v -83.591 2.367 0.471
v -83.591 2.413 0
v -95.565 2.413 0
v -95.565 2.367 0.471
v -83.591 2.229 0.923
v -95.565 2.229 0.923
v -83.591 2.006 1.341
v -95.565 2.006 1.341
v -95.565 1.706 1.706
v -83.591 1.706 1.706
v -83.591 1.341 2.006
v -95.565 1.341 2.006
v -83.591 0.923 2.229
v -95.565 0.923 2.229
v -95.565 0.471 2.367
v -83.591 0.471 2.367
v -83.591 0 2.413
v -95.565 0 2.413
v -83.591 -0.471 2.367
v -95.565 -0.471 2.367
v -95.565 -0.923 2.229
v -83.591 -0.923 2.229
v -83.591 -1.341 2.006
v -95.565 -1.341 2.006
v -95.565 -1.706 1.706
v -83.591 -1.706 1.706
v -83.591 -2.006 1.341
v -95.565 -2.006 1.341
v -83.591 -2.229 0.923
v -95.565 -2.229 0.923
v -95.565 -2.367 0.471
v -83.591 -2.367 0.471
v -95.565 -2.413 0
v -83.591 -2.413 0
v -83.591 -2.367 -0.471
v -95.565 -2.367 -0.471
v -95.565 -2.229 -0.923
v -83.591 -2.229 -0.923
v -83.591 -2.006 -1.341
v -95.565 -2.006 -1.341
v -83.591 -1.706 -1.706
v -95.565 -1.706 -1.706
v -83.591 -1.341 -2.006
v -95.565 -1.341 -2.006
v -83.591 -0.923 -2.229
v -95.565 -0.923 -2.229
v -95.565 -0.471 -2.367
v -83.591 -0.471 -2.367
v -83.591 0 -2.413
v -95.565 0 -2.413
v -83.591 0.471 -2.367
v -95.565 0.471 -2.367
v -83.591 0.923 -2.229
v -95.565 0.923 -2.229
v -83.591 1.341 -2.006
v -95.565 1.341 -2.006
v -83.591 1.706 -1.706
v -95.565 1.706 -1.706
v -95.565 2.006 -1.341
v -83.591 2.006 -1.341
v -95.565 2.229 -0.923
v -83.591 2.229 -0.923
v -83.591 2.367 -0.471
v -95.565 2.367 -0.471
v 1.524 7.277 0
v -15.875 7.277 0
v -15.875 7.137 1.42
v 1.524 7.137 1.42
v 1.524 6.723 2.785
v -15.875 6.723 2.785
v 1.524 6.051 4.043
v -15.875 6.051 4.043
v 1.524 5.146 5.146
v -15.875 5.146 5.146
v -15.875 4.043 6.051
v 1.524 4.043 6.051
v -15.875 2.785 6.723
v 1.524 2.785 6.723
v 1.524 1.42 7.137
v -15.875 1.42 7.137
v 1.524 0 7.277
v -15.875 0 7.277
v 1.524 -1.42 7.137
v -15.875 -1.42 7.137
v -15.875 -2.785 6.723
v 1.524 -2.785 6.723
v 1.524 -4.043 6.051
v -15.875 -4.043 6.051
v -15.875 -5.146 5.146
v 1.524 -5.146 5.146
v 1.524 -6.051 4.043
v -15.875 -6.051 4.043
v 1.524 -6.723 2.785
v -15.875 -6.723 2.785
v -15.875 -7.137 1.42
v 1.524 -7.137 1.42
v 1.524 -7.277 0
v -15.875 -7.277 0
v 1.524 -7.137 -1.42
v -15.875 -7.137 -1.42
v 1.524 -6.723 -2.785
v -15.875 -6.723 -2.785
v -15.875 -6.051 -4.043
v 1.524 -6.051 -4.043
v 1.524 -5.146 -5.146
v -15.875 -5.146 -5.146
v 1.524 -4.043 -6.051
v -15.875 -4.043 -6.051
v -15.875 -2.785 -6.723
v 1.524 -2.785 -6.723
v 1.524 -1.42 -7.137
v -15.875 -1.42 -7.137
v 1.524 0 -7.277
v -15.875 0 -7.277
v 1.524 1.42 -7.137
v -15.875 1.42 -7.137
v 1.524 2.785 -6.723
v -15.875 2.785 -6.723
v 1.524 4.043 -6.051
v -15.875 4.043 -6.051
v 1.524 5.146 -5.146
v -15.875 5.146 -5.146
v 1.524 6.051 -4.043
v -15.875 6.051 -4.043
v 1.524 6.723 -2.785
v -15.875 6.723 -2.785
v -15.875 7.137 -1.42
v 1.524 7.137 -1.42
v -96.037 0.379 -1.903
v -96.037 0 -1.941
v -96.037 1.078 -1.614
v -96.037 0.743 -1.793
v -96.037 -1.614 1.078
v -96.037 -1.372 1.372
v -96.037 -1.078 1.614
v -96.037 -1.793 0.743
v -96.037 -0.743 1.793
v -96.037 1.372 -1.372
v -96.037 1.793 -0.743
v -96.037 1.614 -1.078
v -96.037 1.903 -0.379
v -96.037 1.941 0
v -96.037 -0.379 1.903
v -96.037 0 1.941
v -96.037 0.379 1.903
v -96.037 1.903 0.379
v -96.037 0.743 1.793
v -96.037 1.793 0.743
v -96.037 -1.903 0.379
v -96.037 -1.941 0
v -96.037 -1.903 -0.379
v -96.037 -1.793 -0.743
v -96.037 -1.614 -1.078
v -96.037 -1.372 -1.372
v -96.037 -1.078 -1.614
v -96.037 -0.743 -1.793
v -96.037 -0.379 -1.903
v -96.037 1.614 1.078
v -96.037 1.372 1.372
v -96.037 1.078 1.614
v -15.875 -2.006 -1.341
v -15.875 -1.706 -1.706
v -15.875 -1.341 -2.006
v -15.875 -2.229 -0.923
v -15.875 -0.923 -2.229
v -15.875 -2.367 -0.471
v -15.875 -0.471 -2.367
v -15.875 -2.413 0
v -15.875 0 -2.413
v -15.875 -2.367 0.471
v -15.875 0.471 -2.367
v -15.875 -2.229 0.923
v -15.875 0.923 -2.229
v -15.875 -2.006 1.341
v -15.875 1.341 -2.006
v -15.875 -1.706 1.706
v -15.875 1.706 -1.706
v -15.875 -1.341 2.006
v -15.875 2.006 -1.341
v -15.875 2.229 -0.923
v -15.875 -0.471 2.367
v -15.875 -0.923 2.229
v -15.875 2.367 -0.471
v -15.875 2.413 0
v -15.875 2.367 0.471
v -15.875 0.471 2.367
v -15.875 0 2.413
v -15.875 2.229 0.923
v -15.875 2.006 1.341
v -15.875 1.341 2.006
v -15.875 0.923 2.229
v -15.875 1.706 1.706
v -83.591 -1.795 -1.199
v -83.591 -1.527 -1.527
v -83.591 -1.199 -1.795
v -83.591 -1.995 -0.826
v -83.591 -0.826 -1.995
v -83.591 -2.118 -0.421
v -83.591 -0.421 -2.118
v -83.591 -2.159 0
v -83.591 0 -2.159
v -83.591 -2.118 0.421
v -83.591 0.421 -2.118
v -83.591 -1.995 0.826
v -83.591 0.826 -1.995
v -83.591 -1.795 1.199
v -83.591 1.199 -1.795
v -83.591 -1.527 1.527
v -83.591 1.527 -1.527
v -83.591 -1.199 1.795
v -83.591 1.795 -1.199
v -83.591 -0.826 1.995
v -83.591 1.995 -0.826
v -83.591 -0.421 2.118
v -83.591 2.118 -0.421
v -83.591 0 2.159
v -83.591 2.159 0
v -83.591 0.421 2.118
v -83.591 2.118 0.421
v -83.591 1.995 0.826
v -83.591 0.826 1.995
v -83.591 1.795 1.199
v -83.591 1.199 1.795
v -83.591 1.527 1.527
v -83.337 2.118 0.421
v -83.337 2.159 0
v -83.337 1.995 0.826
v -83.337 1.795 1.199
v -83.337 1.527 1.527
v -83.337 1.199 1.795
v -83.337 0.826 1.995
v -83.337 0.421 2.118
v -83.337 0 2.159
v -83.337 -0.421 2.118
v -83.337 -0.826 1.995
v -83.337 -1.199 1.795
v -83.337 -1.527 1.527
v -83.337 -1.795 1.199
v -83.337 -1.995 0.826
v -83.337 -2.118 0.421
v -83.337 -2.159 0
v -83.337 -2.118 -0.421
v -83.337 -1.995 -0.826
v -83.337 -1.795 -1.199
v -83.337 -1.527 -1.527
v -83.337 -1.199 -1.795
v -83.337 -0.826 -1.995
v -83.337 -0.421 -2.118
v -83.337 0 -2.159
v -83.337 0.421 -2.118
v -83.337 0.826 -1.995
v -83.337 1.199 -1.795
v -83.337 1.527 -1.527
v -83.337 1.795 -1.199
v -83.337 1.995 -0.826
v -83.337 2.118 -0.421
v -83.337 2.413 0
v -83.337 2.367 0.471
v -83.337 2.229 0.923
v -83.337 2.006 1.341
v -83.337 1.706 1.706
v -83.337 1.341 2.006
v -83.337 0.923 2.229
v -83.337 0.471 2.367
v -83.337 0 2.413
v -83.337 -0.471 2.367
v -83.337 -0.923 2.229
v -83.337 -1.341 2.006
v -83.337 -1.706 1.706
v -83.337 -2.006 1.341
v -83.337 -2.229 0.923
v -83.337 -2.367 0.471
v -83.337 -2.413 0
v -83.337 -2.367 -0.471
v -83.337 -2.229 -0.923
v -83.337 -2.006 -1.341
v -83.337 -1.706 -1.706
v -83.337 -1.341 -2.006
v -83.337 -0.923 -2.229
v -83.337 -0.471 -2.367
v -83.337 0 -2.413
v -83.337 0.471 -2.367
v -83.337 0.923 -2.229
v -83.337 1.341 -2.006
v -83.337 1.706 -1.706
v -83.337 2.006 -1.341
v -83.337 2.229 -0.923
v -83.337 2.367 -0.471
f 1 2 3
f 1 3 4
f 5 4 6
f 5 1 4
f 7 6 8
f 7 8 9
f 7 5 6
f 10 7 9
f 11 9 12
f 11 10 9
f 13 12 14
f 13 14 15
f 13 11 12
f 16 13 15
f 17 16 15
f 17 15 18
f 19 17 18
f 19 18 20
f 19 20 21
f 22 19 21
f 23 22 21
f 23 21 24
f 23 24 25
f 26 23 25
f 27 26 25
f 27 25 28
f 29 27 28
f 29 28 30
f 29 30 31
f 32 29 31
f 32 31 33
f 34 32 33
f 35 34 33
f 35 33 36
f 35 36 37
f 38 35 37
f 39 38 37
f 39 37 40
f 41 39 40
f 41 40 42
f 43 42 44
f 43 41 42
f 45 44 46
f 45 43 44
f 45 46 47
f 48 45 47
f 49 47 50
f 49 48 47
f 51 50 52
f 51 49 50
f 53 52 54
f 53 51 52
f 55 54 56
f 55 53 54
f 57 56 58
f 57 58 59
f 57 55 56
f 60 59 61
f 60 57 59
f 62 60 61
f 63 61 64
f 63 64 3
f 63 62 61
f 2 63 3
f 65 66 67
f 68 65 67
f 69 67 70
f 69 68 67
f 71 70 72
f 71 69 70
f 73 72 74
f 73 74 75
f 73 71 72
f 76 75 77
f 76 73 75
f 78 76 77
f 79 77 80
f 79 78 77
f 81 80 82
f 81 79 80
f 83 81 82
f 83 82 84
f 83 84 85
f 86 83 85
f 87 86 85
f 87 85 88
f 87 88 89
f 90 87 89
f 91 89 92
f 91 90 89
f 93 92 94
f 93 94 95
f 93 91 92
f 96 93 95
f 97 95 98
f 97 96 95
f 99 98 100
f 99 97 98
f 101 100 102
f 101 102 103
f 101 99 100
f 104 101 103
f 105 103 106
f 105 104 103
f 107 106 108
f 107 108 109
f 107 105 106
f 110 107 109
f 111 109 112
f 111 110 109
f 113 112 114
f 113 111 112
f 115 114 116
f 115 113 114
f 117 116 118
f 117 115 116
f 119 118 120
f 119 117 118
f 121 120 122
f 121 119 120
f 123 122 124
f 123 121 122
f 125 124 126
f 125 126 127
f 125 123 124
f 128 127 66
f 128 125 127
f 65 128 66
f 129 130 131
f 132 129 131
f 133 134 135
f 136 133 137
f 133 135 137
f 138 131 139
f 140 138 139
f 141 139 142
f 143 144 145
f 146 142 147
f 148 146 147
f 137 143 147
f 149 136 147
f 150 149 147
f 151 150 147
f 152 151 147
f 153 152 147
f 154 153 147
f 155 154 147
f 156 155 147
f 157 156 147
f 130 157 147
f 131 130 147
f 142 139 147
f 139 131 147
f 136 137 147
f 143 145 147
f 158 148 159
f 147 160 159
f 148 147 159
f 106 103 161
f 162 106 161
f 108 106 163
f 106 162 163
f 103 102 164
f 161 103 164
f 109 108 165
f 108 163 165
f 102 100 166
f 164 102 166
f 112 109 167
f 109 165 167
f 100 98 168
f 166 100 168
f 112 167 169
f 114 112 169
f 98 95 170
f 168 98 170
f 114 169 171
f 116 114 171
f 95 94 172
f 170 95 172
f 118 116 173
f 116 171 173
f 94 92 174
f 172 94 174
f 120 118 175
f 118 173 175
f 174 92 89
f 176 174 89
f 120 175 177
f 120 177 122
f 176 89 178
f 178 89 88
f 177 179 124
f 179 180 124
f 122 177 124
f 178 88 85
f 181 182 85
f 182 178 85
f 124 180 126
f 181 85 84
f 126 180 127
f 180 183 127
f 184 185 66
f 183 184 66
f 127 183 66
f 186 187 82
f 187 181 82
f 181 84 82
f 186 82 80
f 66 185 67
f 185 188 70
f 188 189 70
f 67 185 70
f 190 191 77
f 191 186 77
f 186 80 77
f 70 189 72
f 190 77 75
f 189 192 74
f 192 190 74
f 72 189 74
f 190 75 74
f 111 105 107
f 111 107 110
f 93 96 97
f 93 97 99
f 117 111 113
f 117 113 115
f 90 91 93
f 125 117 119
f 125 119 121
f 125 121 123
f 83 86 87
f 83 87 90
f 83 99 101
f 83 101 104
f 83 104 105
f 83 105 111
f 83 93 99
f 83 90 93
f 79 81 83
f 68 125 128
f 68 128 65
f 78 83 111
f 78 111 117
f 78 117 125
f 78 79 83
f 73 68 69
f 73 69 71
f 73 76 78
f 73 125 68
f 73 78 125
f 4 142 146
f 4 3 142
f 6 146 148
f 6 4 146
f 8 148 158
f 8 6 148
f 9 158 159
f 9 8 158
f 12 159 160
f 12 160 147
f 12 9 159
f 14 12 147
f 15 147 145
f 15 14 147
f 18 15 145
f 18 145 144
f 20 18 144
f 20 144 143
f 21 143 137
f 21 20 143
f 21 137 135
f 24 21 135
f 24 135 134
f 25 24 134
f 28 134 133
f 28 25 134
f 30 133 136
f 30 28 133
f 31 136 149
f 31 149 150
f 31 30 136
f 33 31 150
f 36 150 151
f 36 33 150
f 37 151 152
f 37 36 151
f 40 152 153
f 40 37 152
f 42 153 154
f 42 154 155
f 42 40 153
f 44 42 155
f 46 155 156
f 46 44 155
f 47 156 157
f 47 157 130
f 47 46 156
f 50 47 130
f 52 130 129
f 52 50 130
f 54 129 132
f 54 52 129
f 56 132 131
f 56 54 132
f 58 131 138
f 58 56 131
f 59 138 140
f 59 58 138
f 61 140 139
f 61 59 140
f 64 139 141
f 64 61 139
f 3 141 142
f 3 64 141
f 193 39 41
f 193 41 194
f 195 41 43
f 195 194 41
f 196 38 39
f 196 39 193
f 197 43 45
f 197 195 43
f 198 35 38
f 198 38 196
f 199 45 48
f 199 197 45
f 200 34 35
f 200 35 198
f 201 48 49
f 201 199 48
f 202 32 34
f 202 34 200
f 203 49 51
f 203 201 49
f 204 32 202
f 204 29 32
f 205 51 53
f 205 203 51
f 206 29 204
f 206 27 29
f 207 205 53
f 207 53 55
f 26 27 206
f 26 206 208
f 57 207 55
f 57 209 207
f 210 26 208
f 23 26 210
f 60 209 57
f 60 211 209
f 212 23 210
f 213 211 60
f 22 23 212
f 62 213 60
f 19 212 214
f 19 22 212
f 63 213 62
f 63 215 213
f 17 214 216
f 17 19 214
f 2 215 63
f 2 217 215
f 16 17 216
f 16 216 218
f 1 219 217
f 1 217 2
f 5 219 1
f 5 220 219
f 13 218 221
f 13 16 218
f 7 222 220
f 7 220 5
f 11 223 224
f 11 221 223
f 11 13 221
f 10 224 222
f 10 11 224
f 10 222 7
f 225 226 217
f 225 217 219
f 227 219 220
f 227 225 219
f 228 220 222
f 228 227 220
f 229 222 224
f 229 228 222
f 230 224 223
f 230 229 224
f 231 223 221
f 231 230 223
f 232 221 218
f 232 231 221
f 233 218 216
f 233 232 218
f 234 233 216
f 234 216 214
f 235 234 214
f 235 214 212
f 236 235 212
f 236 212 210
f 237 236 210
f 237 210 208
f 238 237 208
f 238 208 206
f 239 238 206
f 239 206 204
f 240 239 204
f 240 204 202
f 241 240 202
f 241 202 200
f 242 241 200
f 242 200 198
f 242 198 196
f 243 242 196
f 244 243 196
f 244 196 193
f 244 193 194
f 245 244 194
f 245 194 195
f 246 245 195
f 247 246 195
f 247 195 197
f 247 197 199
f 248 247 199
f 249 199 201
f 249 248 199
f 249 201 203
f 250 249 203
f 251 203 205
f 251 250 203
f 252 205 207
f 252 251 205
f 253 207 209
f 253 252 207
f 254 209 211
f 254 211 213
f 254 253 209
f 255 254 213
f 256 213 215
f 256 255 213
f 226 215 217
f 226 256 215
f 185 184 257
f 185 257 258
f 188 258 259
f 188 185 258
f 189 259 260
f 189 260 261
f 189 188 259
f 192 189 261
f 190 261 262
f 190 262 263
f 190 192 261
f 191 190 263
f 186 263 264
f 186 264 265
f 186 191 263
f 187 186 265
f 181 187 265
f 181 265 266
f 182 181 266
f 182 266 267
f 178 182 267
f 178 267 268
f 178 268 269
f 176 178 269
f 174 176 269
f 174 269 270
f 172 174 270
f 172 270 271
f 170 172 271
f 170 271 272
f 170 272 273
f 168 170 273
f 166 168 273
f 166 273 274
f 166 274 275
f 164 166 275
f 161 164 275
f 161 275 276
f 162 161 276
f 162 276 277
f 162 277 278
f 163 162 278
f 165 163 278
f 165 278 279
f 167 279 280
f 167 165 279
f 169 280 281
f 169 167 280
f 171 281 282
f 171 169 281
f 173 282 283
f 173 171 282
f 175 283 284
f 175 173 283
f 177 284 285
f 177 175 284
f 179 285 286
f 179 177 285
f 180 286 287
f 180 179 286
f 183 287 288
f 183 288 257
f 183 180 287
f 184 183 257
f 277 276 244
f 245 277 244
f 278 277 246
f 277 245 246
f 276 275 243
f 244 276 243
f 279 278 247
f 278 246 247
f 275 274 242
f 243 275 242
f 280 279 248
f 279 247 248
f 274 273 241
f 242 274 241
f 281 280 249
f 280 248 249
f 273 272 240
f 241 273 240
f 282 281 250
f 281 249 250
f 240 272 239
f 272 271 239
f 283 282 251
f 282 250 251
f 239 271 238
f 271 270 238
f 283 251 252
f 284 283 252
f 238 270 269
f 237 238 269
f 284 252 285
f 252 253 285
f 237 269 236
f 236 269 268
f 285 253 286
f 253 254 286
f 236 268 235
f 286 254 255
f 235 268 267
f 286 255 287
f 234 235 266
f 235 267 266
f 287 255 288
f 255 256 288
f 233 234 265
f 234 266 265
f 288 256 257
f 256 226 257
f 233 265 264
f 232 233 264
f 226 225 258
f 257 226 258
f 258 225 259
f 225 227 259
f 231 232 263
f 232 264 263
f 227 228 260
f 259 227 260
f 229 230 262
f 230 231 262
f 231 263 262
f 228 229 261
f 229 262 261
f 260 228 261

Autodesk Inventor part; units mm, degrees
sketch "Sketch_3" plane through (0, 0, 0) normal (0, 0, 1) x (1, 0, 0)
  line L0 (0, 0) -> (-96.0374, 0)
  line L1 (-96.0374, 0) -> (-96.0374, 1.9406)
  line L2 (-96.0374, 1.9406) -> (-95.565, 2.413)
  line L3 (-95.565, 2.413) -> (0, 2.413)
  line L4 (0, 2.413) -> (0, 0)
  line L5 (0, 0) -> (-96.0374, 0)
revolve "Revolution1" add sketch "Sketch_3" angle 360 about axis through (0, 0, 0) along (1, 0, 0)
thread "Thread1" size "10-32 UNF" class "2A" standard "ANSI Unified Screw Threads" length 12.446 offset 83.5914
sketch "Sketch_17" plane through (0, 0, 0) normal (0, 0, 1) x (1, 0, 0)
  line L0 (96.0374, 0) -> (-96.0374, 0)
  line L1 (-83.5914, 2.413) -> (-83.5914, 2.159)
  line L2 (-83.5914, 2.159) -> (-83.3374, 2.159)
  line L3 (-83.3374, 2.159) -> (-83.3374, 2.413)
  line L4 (-83.3374, 2.413) -> (-83.5914, 2.413)
revolve "Revolution2" cut sketch "Sketch_17" angle 360 about axis through (96.0374, 0, 0) along (1, 0, 0)
sketch "Sketch_12" plane through (0, 0, 0) normal (0, 0, 1) x (1, 0, 0)
  line L0 (1.524, 0) -> (-15.875, 0)
  line L1 (-15.875, 0) -> (-15.875, 7.2771)
  line L2 (-15.875, 7.2771) -> (1.524, 7.2771)
  line L3 (1.524, 7.2771) -> (1.524, 0)
  line L4 (1.524, 0) -> (-15.875, 0)
revolve "Revolution3" add sketch "Sketch_12" angle 360 about axis through (1.524, 0, 0) along (1, 0, 0)
ref_plane "h1_XY" through (-96.0374, 0, 0) normal (0, 1, 0) x (1, 0, 0)
ref_plane "h1_YZ" through (-96.0374, 0, 0) normal (1, 0, 0) x (0, 0, -1)
ref_plane "h1_ZX" through (-96.0374, 0, 0) normal (0, 0, -1) x (0, 1, 0)
ref_plane "h2_XY" through (-83.3374, 0, 0) normal (0, 1, 0) x (1, 0, 0)
ref_plane "h2_YZ" through (-83.3374, 0, 0) normal (1, 0, 0) x (0, 0, -1)
ref_plane "h2_ZX" through (-83.3374, 0, 0) normal (0, 0, -1) x (0, 1, 0)
ref_plane "k1_XY" through (-96.0374, 0, -2.413) normal (0, 1, 0) x (1, 0, 0)
ref_plane "k1_YZ" through (-96.0374, 0, -2.413) normal (1, 0, 0) x (0, 0, -1)
ref_plane "k1_ZX" through (-96.0374, 0, -2.413) normal (0, 0, -1) x (0, 1, 0)
ref_plane "k2_XY" through (-96.0374, 0, 2.413) normal (0, 1, 0) x (1, 0, 0)
ref_plane "k2_YZ" through (-96.0374, 0, 2.413) normal (1, 0, 0) x (0, 0, -1)
ref_plane "k2_ZX" through (-96.0374, 0, 2.413) normal (0, 0, -1) x (0, 1, 0)
ref_plane "start_XY" through (-83.3374, 0, 0) normal (0, 1, 0) x (1, 0, 0)
ref_plane "start_YZ" through (-83.3374, 0, 0) normal (1, 0, 0) x (0, 0, -1)
ref_plane "start_ZX" through (-83.3374, 0, 0) normal (0, 0, -1) x (0, 1, 0)
ref_plane "to_prc_XY" through (-83.3374, 0, 0) normal (1, 0, 0) x (0, 0, -1)
ref_plane "to_prc_YZ" through (-83.3374, 0, 0) normal (0, 0, -1) x (0, 1, 0)
ref_plane "to_prc_ZX" through (-83.3374, 0, 0) normal (0, 1, 0) x (1, 0, 0)
ref_plane "to_rod_guide_XY" through (-96.0374, 0, 0) normal (1, 0, 0) x (0, 0, -1)
ref_plane "to_rod_guide_YZ" through (-96.0374, 0, 0) normal (0, 0, -1) x (0, 1, 0)
ref_plane "to_rod_guide_ZX" through (-96.0374, 0, 0) normal (0, 1, 0) x (1, 0, 0)
properties part number "D-75081.25-0.25XP-3.781-3pos" material "Steel"
